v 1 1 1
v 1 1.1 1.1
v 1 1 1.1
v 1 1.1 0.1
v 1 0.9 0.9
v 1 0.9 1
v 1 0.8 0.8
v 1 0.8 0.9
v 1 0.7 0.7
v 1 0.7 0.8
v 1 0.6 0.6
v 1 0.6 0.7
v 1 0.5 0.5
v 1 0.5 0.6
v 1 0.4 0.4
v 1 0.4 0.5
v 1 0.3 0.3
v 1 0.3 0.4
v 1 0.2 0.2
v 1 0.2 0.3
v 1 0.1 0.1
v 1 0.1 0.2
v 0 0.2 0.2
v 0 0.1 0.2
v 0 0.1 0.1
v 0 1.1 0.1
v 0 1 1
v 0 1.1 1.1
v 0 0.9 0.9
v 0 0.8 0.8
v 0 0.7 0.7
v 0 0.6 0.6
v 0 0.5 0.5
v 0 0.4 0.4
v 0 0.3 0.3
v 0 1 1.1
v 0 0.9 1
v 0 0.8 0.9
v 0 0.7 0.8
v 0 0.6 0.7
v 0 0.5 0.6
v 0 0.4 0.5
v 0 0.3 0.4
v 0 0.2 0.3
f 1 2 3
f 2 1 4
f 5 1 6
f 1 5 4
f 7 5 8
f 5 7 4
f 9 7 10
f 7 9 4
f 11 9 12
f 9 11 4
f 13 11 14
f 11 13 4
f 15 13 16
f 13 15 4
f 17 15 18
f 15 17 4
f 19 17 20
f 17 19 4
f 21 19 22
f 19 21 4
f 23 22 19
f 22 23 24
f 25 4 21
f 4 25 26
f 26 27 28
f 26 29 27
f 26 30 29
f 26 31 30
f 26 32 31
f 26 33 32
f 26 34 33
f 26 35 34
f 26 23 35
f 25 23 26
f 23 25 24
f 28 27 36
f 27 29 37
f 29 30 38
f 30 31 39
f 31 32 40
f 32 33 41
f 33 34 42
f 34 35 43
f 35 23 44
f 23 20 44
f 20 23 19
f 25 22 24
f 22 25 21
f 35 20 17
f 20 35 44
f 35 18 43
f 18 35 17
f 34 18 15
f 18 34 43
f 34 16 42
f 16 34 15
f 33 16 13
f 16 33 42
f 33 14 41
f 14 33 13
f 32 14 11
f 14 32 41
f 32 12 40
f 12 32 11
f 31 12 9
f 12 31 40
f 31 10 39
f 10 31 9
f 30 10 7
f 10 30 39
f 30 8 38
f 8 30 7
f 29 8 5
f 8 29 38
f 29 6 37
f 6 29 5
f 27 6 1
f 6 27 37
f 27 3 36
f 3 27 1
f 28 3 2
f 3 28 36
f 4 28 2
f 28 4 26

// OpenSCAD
color([0.3, 0.3, 0.5])
for (i = [0.1:0.1:1]) {
    translate([0,i,0.1])
    cube([1,.1, i]);
}
